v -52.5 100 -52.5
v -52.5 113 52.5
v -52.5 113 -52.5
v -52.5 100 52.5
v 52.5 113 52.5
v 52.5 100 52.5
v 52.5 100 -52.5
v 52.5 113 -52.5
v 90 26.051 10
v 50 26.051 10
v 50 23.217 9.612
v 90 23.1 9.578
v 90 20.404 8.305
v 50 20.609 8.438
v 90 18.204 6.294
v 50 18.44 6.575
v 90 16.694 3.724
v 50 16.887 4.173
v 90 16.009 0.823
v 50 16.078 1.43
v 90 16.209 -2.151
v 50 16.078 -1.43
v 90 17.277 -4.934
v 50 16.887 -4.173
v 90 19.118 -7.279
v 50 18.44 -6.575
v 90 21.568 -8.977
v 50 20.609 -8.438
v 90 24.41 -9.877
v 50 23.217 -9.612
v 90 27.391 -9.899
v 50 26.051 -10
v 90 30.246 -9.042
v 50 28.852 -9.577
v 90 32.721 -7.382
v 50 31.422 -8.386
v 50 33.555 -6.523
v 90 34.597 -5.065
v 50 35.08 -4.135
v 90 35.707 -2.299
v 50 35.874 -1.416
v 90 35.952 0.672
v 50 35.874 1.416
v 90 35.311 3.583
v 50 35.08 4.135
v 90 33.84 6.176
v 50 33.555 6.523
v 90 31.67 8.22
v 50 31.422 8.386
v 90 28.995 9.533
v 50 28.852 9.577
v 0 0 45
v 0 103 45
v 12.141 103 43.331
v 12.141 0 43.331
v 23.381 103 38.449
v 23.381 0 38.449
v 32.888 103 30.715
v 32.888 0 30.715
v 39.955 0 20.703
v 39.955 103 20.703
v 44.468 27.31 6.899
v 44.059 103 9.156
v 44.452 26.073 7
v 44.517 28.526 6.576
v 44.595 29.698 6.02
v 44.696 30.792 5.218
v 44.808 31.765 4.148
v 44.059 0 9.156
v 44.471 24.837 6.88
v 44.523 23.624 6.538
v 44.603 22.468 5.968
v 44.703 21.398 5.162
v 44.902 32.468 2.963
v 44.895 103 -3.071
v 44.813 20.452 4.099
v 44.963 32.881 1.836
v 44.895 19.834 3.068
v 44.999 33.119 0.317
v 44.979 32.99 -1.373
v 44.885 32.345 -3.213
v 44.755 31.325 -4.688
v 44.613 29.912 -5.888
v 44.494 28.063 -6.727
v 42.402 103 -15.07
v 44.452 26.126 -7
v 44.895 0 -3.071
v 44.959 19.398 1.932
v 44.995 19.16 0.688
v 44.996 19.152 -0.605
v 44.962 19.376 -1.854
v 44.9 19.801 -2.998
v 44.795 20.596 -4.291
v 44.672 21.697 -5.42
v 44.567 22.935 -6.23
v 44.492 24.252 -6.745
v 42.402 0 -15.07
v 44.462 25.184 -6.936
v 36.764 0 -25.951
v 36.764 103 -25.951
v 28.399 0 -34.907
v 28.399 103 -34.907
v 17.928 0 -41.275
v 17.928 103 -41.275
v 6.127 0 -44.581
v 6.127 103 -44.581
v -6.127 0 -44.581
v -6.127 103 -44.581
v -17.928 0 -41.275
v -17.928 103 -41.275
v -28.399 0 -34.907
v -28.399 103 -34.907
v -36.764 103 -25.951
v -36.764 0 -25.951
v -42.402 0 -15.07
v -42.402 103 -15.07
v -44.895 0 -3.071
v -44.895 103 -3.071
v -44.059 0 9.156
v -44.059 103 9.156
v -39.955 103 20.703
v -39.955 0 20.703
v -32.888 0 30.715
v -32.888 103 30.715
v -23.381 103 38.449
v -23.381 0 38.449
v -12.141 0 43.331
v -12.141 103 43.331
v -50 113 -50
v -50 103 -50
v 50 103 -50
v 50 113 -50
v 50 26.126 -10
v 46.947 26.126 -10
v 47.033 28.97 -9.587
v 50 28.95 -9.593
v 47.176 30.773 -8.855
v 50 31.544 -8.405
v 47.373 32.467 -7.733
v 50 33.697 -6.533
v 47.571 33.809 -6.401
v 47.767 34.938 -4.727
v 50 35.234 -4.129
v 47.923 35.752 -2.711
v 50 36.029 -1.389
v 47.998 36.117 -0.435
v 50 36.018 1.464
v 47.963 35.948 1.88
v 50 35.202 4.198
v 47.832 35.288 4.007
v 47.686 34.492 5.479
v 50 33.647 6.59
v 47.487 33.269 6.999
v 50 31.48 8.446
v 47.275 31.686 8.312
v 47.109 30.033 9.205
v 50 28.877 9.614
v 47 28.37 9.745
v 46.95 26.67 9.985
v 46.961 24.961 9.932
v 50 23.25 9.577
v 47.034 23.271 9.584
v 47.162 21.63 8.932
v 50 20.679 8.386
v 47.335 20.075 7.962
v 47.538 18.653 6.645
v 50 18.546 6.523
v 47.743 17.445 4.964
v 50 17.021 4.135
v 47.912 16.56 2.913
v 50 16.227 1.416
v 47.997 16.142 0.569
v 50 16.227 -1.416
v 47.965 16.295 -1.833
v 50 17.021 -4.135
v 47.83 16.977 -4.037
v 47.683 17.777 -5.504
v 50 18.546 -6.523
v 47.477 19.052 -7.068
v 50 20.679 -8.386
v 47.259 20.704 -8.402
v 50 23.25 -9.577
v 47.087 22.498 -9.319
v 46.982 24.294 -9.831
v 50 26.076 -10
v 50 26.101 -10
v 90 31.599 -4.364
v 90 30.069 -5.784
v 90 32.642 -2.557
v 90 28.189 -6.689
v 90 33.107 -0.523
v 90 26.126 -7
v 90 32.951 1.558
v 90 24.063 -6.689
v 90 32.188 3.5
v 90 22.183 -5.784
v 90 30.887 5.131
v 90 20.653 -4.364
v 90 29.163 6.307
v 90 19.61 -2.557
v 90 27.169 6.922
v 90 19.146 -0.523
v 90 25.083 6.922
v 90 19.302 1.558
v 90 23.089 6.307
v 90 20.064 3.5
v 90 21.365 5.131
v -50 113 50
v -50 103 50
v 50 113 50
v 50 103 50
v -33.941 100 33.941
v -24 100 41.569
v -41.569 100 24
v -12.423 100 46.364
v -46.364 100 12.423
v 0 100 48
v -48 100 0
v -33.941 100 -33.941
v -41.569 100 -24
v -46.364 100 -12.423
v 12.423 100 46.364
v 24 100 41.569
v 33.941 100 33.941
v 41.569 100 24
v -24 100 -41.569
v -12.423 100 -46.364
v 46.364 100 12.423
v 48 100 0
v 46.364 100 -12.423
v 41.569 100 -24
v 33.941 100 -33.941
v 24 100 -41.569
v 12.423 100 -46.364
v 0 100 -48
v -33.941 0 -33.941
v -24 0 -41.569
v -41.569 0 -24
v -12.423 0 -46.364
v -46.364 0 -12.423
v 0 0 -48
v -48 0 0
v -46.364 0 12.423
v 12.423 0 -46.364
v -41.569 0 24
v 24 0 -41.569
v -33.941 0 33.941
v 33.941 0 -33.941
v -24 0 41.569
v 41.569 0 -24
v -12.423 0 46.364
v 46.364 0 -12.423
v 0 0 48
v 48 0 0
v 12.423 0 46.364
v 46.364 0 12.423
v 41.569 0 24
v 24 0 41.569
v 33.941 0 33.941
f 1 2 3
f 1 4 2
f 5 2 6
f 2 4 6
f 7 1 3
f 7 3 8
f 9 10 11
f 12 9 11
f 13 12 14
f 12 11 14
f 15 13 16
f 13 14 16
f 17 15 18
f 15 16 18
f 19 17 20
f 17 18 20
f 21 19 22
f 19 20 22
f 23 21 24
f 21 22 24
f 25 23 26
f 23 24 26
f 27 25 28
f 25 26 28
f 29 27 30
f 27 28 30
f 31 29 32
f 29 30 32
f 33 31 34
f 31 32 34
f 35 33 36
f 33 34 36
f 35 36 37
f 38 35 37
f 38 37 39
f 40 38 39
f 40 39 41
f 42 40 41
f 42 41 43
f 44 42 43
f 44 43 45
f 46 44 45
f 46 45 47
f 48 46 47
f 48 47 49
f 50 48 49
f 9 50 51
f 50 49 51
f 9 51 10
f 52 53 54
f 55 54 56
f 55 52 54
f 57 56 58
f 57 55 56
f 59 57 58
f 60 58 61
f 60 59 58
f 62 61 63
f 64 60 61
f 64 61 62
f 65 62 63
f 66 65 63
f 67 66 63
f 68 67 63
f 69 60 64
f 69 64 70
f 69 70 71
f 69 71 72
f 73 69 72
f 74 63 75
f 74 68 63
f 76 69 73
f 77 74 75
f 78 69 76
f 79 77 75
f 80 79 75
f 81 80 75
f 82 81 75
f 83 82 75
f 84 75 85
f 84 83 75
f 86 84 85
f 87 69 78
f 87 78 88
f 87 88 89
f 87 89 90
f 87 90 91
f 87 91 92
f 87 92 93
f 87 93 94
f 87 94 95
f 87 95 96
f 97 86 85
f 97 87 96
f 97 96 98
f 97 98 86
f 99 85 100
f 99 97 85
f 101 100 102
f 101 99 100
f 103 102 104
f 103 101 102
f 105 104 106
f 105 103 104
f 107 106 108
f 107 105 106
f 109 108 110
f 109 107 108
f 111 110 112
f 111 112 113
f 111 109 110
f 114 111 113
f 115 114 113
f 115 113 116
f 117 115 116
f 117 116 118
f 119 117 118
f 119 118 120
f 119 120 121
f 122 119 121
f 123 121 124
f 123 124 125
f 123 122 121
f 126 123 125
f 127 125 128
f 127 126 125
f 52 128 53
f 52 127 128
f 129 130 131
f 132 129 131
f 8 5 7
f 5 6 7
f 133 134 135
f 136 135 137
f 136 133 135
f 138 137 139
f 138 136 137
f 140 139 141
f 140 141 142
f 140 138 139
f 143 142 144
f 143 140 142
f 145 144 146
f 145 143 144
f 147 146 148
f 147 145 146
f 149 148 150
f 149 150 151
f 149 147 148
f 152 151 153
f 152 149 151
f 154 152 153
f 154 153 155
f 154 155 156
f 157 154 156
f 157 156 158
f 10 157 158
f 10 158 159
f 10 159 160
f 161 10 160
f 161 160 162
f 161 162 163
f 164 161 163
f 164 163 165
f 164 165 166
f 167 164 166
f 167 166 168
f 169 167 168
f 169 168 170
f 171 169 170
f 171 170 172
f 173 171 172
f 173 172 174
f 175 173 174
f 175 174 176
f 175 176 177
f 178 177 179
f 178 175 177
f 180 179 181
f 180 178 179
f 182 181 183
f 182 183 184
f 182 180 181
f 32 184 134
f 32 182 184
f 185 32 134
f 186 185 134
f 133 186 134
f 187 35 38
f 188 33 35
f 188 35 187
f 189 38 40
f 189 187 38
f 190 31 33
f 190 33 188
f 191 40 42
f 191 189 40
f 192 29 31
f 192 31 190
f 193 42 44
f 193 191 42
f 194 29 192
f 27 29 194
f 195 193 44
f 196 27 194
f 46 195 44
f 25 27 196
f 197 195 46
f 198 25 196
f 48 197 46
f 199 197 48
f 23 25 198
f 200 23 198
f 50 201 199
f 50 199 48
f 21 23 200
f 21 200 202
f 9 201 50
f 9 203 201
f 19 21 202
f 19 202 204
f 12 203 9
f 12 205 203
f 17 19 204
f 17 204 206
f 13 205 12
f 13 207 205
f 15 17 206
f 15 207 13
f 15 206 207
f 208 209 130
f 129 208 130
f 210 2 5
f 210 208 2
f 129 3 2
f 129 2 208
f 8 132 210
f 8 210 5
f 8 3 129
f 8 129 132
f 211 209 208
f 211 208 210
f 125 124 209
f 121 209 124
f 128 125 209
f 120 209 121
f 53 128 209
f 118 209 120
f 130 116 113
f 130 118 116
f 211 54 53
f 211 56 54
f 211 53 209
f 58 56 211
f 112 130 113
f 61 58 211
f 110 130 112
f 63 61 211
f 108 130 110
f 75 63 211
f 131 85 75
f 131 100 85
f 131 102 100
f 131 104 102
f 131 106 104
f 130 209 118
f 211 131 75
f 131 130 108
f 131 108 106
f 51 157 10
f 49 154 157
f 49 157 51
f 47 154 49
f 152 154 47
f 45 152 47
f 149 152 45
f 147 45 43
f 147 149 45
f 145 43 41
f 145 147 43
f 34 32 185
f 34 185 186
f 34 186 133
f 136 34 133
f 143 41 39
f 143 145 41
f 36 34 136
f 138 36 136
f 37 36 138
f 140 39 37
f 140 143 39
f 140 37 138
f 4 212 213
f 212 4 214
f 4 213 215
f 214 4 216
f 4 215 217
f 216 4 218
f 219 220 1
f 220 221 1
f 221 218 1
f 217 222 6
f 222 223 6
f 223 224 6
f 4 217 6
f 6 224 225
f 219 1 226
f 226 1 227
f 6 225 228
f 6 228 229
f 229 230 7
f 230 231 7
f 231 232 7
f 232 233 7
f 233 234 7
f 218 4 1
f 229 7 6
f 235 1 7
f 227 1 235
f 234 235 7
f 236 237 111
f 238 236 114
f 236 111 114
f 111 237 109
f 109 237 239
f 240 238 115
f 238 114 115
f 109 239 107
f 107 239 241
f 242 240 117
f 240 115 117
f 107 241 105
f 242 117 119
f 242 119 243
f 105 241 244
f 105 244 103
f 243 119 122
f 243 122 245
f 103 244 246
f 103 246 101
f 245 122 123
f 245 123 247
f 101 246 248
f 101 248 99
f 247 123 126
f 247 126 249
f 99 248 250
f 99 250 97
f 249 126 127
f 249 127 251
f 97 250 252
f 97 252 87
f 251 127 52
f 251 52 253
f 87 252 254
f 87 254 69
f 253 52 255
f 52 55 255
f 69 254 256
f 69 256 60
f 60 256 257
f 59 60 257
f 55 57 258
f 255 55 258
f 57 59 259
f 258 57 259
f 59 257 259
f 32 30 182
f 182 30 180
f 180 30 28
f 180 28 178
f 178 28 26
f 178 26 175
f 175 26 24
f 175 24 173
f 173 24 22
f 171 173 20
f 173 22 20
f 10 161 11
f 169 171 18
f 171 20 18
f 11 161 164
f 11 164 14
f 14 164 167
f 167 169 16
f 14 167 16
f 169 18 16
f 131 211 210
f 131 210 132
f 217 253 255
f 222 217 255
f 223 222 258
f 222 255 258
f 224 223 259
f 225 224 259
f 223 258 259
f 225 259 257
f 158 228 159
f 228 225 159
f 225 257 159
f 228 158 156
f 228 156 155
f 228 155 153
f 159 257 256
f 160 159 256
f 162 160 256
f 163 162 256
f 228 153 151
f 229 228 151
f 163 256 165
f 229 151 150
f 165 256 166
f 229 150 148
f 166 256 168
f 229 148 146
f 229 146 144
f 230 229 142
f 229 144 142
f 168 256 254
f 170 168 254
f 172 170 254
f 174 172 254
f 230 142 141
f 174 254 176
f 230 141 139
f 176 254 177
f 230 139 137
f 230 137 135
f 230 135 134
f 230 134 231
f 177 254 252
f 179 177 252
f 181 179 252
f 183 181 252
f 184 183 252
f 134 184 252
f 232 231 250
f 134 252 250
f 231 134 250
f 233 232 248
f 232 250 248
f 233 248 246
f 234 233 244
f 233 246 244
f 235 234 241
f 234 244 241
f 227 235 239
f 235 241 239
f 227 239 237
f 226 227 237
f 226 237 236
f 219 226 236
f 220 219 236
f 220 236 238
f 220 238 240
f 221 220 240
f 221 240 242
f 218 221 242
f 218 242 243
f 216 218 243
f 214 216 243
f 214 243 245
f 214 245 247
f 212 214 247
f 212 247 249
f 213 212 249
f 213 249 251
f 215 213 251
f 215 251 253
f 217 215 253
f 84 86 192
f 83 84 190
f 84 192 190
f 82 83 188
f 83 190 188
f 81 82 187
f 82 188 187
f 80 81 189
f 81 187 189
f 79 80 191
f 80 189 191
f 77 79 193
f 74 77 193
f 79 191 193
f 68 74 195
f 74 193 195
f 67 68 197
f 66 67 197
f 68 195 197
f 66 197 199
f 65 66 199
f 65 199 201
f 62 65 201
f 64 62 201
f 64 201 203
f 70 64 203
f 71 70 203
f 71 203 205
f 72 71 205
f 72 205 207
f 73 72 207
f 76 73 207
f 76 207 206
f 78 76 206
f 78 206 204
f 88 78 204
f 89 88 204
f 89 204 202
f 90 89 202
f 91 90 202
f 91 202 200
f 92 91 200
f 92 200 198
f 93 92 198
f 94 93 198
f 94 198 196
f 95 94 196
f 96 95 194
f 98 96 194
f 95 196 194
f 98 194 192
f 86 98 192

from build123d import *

# Parameters (mm, degrees)
SKETCH3_R                = 48
SKETCH3_R_2              = 45
BOSS_EXTRUDE1_DEPTH      = 100
BOSS_EXTRUDE2_REACH      = 150.014
BOSS_EXTRUDE2_END_RADIUS = 48
SKETCH5_R                = 10
SKETCH6_R                = 10
BOSS_EXTRUDE3_DEPTH      = 40
SKETCH7_R                = 7
CUT_EXTRUDE1_DEPTH       = 55
SKETCH8_W                = 105
SKETCH8_H                = 105
SKETCH8_R                = 45
BOSS_EXTRUDE4_DEPTH      = 3
SKETCH9_W                = 105
SKETCH9_H                = 105
SKETCH9_W_2              = 100
SKETCH9_H_2              = 100
BOSS_EXTRUDE5_DEPTH      = 10


with BuildPart() as part:
    # Sketch3 → Boss-Extrude1 (new body)
    with BuildSketch(Plane(origin=(0, 0, 0), x_dir=(1, 0, 0), z_dir=(0, 1, 0))):
        with Locations(Location((0, 0, 0), (0, 0, 270))):
            Circle(SKETCH3_R)
        with Locations(Location((0, 0, 0), (0, 0, 270))):
            Circle(SKETCH3_R_2, mode=Mode.SUBTRACT)
    extrude(amount=BOSS_EXTRUDE1_DEPTH)

    # Boss-Extrude2: up to this cylinder (the profile starts outside it)
    boss_extrude2_end = Plane(origin=(0, 26.126098, 0), z_dir=(0, -1, 0)) * Cylinder(BOSS_EXTRUDE2_END_RADIUS, 397.028, mode=Mode.PRIVATE)
    # Sketch5 → Boss-Extrude2 (add, up to the surface)
    with BuildSketch(Plane(origin=(50, 0, 0), x_dir=(0, 0, -1), z_dir=(1, 0, 0)), mode=Mode.PRIVATE) as boss_extrude2_sk1:
        with Locations((0, 26.126097613)):
            Circle(SKETCH5_R)
    boss_extrude2_tool1 = extrude(boss_extrude2_sk1.sketch, amount=-BOSS_EXTRUDE2_REACH, mode=Mode.PRIVATE) - boss_extrude2_end
    add(boss_extrude2_tool1.solids().sort_by_distance((50, 26.126098, 0))[0])

    # Sketch6 → Boss-Extrude3 (add)
    with BuildSketch(Plane(origin=(50, 0, 0), x_dir=(0, 0, -1), z_dir=(1, 0, 0))):
        with Locations(Location((0, 25.974996965, 0), (0, 0, 179.567124411))):
            Circle(SKETCH6_R)
    extrude(amount=BOSS_EXTRUDE3_DEPTH)

    # Sketch7 → Cut-Extrude1 (cut)
    with BuildSketch(Plane(origin=(90, 0, 0), x_dir=(0, 0, -1), z_dir=(1, 0, 0))):
        with Locations((0, 26.126097613)):
            Circle(SKETCH7_R)
    extrude(amount=-CUT_EXTRUDE1_DEPTH, mode=Mode.SUBTRACT)

    # Sketch8 → Boss-Extrude4 (add)
    with BuildSketch(Plane(origin=(0, 100, 0), x_dir=(1, 0, 0), z_dir=(0, 1, 0))):
        Rectangle(SKETCH8_W, SKETCH8_H)
        with Locations(Location((0, 0, 0), (0, 0, 270))):
            Circle(SKETCH8_R, mode=Mode.SUBTRACT)
    extrude(amount=BOSS_EXTRUDE4_DEPTH)

    # Sketch9 → Boss-Extrude5 (add)
    with BuildSketch(Plane(origin=(0, 103, 0), x_dir=(1, 0, 0), z_dir=(0, 1, 0))):
        Rectangle(SKETCH9_W, SKETCH9_H)
        Rectangle(SKETCH9_W_2, SKETCH9_H_2, mode=Mode.SUBTRACT)
    extrude(amount=BOSS_EXTRUDE5_DEPTH)


solid = part.part
